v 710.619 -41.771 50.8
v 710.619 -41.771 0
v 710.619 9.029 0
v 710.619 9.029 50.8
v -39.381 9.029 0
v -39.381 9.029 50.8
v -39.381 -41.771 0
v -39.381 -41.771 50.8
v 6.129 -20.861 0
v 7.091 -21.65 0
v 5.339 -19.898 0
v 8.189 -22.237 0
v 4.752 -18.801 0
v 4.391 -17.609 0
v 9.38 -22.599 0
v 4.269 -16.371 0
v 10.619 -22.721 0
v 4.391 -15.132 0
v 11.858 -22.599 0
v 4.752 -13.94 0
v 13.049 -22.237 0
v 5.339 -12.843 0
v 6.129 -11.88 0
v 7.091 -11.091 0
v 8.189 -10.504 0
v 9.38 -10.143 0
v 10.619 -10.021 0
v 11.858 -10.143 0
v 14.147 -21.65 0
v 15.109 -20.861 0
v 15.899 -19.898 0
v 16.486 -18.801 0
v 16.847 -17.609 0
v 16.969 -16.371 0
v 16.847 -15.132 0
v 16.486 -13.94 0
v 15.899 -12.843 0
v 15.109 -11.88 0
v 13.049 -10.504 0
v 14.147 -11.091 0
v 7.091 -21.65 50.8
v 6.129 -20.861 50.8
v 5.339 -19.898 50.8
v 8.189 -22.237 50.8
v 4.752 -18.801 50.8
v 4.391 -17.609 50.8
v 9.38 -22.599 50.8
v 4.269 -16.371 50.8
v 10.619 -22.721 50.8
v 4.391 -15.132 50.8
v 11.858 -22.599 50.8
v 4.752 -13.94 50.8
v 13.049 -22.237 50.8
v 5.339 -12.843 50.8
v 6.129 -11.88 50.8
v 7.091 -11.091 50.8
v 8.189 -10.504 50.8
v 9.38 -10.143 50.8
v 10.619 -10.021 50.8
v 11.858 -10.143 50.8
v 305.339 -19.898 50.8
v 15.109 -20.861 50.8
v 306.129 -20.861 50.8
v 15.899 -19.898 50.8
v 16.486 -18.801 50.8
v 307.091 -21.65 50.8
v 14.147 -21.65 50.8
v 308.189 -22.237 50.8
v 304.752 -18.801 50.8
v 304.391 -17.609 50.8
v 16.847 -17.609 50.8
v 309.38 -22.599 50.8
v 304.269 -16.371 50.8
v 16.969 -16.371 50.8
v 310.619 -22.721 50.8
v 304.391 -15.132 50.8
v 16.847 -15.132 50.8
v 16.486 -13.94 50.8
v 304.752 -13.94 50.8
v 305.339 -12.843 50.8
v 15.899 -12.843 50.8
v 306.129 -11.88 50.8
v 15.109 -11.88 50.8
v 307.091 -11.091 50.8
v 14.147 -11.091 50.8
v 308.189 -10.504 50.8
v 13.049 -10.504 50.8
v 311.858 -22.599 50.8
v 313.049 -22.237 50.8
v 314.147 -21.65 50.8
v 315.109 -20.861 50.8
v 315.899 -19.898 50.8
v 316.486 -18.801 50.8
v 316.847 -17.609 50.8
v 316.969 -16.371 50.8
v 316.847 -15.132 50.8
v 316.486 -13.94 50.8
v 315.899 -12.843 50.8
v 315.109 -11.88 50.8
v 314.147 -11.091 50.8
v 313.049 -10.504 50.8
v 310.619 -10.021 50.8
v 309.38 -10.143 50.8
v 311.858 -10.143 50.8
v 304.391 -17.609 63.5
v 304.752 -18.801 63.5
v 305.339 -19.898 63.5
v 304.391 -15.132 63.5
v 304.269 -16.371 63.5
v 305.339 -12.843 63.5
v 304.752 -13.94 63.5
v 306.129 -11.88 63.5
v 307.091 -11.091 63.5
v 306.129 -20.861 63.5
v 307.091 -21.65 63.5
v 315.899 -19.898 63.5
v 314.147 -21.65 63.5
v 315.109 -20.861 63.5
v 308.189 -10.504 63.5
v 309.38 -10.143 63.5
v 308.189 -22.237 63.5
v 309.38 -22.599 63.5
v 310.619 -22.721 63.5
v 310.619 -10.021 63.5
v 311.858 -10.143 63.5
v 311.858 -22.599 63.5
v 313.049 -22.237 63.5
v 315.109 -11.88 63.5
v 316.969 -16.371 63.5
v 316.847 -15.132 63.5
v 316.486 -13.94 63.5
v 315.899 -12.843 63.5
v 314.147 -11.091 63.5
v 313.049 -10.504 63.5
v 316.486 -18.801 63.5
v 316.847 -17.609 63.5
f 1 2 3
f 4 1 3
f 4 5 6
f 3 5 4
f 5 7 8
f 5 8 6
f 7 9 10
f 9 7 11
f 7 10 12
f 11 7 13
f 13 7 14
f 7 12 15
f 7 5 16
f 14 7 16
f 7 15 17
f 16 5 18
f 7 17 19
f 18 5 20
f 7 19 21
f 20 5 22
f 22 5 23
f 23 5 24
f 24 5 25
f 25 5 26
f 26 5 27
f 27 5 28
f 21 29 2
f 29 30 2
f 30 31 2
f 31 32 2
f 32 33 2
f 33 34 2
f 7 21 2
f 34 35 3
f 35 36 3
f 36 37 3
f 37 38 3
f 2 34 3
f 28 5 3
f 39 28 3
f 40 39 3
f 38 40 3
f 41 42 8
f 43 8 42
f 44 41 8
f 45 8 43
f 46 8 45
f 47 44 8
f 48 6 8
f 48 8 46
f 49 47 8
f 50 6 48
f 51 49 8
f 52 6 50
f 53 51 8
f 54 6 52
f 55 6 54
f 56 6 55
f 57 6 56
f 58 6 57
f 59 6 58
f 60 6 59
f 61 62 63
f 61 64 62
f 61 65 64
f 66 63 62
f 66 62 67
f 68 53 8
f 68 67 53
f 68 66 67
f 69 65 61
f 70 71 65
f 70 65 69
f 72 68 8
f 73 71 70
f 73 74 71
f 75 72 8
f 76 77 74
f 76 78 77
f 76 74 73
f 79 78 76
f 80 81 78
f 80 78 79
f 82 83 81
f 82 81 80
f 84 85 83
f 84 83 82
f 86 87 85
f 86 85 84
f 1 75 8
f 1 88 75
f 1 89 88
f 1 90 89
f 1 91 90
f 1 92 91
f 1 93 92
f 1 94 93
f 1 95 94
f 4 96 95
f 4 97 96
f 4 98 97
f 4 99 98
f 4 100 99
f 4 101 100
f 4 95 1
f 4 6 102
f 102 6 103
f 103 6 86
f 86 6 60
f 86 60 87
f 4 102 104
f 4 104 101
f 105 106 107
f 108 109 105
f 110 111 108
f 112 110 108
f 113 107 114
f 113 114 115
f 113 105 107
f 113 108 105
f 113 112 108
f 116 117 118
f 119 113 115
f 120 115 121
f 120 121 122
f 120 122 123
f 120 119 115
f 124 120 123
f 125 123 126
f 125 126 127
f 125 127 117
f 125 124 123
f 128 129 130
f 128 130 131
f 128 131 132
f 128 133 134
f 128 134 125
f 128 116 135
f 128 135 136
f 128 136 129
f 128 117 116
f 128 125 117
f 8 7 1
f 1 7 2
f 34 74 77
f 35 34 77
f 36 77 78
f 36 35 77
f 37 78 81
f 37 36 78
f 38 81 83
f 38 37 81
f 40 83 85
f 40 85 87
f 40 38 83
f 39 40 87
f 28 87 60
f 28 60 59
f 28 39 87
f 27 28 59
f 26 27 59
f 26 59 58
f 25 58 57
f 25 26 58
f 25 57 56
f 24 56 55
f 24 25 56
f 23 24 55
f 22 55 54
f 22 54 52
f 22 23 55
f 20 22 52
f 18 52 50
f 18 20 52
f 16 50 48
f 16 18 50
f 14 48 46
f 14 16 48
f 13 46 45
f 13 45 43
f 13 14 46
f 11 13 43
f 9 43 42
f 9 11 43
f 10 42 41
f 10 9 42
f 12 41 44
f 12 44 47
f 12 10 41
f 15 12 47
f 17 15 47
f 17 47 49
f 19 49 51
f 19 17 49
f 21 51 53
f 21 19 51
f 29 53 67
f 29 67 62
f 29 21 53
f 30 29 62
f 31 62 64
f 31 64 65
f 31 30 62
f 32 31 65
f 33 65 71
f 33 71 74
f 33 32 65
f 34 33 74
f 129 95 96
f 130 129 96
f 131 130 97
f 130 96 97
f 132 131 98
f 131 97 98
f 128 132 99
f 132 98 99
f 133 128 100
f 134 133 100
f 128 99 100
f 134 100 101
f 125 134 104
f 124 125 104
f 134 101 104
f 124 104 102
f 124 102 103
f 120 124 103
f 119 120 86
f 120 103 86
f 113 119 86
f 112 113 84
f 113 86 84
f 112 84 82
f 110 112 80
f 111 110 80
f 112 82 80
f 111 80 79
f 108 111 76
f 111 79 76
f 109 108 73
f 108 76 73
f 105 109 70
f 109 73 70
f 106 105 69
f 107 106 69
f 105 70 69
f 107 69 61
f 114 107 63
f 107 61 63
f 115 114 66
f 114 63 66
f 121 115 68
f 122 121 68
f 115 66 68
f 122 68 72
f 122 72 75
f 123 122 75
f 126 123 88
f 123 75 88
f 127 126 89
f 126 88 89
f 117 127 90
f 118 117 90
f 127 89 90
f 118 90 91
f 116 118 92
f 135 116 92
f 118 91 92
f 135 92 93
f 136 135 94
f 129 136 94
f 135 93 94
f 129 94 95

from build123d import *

# Parameters (mm, degrees)
SKETCH1_W           = 750
SKETCH1_H           = 50.8
SKETCH1_R           = 6.35
BOSS_EXTRUDE1_DEPTH = 50.8
SKETCH2_R           = 6.35
BOSS_EXTRUDE2_DEPTH = 12.7


with BuildPart() as part:
    # Sketch1 → Boss-Extrude1 (new body)
    with BuildSketch(Plane.XY):
        with Locations((335.619050288, -16.370527994)):
            Rectangle(SKETCH1_W, SKETCH1_H)
        with Locations((10.619050288, -16.370527994)):
            Circle(SKETCH1_R, mode=Mode.SUBTRACT)
    extrude(amount=BOSS_EXTRUDE1_DEPTH)

    # Sketch2 → Boss-Extrude2 (add)
    with BuildSketch(Plane.XY.offset(50.8)):
        with Locations((310.619050288, -16.370527994)):
            Circle(SKETCH2_R)
    extrude(amount=BOSS_EXTRUDE2_DEPTH)


solid = part.part
